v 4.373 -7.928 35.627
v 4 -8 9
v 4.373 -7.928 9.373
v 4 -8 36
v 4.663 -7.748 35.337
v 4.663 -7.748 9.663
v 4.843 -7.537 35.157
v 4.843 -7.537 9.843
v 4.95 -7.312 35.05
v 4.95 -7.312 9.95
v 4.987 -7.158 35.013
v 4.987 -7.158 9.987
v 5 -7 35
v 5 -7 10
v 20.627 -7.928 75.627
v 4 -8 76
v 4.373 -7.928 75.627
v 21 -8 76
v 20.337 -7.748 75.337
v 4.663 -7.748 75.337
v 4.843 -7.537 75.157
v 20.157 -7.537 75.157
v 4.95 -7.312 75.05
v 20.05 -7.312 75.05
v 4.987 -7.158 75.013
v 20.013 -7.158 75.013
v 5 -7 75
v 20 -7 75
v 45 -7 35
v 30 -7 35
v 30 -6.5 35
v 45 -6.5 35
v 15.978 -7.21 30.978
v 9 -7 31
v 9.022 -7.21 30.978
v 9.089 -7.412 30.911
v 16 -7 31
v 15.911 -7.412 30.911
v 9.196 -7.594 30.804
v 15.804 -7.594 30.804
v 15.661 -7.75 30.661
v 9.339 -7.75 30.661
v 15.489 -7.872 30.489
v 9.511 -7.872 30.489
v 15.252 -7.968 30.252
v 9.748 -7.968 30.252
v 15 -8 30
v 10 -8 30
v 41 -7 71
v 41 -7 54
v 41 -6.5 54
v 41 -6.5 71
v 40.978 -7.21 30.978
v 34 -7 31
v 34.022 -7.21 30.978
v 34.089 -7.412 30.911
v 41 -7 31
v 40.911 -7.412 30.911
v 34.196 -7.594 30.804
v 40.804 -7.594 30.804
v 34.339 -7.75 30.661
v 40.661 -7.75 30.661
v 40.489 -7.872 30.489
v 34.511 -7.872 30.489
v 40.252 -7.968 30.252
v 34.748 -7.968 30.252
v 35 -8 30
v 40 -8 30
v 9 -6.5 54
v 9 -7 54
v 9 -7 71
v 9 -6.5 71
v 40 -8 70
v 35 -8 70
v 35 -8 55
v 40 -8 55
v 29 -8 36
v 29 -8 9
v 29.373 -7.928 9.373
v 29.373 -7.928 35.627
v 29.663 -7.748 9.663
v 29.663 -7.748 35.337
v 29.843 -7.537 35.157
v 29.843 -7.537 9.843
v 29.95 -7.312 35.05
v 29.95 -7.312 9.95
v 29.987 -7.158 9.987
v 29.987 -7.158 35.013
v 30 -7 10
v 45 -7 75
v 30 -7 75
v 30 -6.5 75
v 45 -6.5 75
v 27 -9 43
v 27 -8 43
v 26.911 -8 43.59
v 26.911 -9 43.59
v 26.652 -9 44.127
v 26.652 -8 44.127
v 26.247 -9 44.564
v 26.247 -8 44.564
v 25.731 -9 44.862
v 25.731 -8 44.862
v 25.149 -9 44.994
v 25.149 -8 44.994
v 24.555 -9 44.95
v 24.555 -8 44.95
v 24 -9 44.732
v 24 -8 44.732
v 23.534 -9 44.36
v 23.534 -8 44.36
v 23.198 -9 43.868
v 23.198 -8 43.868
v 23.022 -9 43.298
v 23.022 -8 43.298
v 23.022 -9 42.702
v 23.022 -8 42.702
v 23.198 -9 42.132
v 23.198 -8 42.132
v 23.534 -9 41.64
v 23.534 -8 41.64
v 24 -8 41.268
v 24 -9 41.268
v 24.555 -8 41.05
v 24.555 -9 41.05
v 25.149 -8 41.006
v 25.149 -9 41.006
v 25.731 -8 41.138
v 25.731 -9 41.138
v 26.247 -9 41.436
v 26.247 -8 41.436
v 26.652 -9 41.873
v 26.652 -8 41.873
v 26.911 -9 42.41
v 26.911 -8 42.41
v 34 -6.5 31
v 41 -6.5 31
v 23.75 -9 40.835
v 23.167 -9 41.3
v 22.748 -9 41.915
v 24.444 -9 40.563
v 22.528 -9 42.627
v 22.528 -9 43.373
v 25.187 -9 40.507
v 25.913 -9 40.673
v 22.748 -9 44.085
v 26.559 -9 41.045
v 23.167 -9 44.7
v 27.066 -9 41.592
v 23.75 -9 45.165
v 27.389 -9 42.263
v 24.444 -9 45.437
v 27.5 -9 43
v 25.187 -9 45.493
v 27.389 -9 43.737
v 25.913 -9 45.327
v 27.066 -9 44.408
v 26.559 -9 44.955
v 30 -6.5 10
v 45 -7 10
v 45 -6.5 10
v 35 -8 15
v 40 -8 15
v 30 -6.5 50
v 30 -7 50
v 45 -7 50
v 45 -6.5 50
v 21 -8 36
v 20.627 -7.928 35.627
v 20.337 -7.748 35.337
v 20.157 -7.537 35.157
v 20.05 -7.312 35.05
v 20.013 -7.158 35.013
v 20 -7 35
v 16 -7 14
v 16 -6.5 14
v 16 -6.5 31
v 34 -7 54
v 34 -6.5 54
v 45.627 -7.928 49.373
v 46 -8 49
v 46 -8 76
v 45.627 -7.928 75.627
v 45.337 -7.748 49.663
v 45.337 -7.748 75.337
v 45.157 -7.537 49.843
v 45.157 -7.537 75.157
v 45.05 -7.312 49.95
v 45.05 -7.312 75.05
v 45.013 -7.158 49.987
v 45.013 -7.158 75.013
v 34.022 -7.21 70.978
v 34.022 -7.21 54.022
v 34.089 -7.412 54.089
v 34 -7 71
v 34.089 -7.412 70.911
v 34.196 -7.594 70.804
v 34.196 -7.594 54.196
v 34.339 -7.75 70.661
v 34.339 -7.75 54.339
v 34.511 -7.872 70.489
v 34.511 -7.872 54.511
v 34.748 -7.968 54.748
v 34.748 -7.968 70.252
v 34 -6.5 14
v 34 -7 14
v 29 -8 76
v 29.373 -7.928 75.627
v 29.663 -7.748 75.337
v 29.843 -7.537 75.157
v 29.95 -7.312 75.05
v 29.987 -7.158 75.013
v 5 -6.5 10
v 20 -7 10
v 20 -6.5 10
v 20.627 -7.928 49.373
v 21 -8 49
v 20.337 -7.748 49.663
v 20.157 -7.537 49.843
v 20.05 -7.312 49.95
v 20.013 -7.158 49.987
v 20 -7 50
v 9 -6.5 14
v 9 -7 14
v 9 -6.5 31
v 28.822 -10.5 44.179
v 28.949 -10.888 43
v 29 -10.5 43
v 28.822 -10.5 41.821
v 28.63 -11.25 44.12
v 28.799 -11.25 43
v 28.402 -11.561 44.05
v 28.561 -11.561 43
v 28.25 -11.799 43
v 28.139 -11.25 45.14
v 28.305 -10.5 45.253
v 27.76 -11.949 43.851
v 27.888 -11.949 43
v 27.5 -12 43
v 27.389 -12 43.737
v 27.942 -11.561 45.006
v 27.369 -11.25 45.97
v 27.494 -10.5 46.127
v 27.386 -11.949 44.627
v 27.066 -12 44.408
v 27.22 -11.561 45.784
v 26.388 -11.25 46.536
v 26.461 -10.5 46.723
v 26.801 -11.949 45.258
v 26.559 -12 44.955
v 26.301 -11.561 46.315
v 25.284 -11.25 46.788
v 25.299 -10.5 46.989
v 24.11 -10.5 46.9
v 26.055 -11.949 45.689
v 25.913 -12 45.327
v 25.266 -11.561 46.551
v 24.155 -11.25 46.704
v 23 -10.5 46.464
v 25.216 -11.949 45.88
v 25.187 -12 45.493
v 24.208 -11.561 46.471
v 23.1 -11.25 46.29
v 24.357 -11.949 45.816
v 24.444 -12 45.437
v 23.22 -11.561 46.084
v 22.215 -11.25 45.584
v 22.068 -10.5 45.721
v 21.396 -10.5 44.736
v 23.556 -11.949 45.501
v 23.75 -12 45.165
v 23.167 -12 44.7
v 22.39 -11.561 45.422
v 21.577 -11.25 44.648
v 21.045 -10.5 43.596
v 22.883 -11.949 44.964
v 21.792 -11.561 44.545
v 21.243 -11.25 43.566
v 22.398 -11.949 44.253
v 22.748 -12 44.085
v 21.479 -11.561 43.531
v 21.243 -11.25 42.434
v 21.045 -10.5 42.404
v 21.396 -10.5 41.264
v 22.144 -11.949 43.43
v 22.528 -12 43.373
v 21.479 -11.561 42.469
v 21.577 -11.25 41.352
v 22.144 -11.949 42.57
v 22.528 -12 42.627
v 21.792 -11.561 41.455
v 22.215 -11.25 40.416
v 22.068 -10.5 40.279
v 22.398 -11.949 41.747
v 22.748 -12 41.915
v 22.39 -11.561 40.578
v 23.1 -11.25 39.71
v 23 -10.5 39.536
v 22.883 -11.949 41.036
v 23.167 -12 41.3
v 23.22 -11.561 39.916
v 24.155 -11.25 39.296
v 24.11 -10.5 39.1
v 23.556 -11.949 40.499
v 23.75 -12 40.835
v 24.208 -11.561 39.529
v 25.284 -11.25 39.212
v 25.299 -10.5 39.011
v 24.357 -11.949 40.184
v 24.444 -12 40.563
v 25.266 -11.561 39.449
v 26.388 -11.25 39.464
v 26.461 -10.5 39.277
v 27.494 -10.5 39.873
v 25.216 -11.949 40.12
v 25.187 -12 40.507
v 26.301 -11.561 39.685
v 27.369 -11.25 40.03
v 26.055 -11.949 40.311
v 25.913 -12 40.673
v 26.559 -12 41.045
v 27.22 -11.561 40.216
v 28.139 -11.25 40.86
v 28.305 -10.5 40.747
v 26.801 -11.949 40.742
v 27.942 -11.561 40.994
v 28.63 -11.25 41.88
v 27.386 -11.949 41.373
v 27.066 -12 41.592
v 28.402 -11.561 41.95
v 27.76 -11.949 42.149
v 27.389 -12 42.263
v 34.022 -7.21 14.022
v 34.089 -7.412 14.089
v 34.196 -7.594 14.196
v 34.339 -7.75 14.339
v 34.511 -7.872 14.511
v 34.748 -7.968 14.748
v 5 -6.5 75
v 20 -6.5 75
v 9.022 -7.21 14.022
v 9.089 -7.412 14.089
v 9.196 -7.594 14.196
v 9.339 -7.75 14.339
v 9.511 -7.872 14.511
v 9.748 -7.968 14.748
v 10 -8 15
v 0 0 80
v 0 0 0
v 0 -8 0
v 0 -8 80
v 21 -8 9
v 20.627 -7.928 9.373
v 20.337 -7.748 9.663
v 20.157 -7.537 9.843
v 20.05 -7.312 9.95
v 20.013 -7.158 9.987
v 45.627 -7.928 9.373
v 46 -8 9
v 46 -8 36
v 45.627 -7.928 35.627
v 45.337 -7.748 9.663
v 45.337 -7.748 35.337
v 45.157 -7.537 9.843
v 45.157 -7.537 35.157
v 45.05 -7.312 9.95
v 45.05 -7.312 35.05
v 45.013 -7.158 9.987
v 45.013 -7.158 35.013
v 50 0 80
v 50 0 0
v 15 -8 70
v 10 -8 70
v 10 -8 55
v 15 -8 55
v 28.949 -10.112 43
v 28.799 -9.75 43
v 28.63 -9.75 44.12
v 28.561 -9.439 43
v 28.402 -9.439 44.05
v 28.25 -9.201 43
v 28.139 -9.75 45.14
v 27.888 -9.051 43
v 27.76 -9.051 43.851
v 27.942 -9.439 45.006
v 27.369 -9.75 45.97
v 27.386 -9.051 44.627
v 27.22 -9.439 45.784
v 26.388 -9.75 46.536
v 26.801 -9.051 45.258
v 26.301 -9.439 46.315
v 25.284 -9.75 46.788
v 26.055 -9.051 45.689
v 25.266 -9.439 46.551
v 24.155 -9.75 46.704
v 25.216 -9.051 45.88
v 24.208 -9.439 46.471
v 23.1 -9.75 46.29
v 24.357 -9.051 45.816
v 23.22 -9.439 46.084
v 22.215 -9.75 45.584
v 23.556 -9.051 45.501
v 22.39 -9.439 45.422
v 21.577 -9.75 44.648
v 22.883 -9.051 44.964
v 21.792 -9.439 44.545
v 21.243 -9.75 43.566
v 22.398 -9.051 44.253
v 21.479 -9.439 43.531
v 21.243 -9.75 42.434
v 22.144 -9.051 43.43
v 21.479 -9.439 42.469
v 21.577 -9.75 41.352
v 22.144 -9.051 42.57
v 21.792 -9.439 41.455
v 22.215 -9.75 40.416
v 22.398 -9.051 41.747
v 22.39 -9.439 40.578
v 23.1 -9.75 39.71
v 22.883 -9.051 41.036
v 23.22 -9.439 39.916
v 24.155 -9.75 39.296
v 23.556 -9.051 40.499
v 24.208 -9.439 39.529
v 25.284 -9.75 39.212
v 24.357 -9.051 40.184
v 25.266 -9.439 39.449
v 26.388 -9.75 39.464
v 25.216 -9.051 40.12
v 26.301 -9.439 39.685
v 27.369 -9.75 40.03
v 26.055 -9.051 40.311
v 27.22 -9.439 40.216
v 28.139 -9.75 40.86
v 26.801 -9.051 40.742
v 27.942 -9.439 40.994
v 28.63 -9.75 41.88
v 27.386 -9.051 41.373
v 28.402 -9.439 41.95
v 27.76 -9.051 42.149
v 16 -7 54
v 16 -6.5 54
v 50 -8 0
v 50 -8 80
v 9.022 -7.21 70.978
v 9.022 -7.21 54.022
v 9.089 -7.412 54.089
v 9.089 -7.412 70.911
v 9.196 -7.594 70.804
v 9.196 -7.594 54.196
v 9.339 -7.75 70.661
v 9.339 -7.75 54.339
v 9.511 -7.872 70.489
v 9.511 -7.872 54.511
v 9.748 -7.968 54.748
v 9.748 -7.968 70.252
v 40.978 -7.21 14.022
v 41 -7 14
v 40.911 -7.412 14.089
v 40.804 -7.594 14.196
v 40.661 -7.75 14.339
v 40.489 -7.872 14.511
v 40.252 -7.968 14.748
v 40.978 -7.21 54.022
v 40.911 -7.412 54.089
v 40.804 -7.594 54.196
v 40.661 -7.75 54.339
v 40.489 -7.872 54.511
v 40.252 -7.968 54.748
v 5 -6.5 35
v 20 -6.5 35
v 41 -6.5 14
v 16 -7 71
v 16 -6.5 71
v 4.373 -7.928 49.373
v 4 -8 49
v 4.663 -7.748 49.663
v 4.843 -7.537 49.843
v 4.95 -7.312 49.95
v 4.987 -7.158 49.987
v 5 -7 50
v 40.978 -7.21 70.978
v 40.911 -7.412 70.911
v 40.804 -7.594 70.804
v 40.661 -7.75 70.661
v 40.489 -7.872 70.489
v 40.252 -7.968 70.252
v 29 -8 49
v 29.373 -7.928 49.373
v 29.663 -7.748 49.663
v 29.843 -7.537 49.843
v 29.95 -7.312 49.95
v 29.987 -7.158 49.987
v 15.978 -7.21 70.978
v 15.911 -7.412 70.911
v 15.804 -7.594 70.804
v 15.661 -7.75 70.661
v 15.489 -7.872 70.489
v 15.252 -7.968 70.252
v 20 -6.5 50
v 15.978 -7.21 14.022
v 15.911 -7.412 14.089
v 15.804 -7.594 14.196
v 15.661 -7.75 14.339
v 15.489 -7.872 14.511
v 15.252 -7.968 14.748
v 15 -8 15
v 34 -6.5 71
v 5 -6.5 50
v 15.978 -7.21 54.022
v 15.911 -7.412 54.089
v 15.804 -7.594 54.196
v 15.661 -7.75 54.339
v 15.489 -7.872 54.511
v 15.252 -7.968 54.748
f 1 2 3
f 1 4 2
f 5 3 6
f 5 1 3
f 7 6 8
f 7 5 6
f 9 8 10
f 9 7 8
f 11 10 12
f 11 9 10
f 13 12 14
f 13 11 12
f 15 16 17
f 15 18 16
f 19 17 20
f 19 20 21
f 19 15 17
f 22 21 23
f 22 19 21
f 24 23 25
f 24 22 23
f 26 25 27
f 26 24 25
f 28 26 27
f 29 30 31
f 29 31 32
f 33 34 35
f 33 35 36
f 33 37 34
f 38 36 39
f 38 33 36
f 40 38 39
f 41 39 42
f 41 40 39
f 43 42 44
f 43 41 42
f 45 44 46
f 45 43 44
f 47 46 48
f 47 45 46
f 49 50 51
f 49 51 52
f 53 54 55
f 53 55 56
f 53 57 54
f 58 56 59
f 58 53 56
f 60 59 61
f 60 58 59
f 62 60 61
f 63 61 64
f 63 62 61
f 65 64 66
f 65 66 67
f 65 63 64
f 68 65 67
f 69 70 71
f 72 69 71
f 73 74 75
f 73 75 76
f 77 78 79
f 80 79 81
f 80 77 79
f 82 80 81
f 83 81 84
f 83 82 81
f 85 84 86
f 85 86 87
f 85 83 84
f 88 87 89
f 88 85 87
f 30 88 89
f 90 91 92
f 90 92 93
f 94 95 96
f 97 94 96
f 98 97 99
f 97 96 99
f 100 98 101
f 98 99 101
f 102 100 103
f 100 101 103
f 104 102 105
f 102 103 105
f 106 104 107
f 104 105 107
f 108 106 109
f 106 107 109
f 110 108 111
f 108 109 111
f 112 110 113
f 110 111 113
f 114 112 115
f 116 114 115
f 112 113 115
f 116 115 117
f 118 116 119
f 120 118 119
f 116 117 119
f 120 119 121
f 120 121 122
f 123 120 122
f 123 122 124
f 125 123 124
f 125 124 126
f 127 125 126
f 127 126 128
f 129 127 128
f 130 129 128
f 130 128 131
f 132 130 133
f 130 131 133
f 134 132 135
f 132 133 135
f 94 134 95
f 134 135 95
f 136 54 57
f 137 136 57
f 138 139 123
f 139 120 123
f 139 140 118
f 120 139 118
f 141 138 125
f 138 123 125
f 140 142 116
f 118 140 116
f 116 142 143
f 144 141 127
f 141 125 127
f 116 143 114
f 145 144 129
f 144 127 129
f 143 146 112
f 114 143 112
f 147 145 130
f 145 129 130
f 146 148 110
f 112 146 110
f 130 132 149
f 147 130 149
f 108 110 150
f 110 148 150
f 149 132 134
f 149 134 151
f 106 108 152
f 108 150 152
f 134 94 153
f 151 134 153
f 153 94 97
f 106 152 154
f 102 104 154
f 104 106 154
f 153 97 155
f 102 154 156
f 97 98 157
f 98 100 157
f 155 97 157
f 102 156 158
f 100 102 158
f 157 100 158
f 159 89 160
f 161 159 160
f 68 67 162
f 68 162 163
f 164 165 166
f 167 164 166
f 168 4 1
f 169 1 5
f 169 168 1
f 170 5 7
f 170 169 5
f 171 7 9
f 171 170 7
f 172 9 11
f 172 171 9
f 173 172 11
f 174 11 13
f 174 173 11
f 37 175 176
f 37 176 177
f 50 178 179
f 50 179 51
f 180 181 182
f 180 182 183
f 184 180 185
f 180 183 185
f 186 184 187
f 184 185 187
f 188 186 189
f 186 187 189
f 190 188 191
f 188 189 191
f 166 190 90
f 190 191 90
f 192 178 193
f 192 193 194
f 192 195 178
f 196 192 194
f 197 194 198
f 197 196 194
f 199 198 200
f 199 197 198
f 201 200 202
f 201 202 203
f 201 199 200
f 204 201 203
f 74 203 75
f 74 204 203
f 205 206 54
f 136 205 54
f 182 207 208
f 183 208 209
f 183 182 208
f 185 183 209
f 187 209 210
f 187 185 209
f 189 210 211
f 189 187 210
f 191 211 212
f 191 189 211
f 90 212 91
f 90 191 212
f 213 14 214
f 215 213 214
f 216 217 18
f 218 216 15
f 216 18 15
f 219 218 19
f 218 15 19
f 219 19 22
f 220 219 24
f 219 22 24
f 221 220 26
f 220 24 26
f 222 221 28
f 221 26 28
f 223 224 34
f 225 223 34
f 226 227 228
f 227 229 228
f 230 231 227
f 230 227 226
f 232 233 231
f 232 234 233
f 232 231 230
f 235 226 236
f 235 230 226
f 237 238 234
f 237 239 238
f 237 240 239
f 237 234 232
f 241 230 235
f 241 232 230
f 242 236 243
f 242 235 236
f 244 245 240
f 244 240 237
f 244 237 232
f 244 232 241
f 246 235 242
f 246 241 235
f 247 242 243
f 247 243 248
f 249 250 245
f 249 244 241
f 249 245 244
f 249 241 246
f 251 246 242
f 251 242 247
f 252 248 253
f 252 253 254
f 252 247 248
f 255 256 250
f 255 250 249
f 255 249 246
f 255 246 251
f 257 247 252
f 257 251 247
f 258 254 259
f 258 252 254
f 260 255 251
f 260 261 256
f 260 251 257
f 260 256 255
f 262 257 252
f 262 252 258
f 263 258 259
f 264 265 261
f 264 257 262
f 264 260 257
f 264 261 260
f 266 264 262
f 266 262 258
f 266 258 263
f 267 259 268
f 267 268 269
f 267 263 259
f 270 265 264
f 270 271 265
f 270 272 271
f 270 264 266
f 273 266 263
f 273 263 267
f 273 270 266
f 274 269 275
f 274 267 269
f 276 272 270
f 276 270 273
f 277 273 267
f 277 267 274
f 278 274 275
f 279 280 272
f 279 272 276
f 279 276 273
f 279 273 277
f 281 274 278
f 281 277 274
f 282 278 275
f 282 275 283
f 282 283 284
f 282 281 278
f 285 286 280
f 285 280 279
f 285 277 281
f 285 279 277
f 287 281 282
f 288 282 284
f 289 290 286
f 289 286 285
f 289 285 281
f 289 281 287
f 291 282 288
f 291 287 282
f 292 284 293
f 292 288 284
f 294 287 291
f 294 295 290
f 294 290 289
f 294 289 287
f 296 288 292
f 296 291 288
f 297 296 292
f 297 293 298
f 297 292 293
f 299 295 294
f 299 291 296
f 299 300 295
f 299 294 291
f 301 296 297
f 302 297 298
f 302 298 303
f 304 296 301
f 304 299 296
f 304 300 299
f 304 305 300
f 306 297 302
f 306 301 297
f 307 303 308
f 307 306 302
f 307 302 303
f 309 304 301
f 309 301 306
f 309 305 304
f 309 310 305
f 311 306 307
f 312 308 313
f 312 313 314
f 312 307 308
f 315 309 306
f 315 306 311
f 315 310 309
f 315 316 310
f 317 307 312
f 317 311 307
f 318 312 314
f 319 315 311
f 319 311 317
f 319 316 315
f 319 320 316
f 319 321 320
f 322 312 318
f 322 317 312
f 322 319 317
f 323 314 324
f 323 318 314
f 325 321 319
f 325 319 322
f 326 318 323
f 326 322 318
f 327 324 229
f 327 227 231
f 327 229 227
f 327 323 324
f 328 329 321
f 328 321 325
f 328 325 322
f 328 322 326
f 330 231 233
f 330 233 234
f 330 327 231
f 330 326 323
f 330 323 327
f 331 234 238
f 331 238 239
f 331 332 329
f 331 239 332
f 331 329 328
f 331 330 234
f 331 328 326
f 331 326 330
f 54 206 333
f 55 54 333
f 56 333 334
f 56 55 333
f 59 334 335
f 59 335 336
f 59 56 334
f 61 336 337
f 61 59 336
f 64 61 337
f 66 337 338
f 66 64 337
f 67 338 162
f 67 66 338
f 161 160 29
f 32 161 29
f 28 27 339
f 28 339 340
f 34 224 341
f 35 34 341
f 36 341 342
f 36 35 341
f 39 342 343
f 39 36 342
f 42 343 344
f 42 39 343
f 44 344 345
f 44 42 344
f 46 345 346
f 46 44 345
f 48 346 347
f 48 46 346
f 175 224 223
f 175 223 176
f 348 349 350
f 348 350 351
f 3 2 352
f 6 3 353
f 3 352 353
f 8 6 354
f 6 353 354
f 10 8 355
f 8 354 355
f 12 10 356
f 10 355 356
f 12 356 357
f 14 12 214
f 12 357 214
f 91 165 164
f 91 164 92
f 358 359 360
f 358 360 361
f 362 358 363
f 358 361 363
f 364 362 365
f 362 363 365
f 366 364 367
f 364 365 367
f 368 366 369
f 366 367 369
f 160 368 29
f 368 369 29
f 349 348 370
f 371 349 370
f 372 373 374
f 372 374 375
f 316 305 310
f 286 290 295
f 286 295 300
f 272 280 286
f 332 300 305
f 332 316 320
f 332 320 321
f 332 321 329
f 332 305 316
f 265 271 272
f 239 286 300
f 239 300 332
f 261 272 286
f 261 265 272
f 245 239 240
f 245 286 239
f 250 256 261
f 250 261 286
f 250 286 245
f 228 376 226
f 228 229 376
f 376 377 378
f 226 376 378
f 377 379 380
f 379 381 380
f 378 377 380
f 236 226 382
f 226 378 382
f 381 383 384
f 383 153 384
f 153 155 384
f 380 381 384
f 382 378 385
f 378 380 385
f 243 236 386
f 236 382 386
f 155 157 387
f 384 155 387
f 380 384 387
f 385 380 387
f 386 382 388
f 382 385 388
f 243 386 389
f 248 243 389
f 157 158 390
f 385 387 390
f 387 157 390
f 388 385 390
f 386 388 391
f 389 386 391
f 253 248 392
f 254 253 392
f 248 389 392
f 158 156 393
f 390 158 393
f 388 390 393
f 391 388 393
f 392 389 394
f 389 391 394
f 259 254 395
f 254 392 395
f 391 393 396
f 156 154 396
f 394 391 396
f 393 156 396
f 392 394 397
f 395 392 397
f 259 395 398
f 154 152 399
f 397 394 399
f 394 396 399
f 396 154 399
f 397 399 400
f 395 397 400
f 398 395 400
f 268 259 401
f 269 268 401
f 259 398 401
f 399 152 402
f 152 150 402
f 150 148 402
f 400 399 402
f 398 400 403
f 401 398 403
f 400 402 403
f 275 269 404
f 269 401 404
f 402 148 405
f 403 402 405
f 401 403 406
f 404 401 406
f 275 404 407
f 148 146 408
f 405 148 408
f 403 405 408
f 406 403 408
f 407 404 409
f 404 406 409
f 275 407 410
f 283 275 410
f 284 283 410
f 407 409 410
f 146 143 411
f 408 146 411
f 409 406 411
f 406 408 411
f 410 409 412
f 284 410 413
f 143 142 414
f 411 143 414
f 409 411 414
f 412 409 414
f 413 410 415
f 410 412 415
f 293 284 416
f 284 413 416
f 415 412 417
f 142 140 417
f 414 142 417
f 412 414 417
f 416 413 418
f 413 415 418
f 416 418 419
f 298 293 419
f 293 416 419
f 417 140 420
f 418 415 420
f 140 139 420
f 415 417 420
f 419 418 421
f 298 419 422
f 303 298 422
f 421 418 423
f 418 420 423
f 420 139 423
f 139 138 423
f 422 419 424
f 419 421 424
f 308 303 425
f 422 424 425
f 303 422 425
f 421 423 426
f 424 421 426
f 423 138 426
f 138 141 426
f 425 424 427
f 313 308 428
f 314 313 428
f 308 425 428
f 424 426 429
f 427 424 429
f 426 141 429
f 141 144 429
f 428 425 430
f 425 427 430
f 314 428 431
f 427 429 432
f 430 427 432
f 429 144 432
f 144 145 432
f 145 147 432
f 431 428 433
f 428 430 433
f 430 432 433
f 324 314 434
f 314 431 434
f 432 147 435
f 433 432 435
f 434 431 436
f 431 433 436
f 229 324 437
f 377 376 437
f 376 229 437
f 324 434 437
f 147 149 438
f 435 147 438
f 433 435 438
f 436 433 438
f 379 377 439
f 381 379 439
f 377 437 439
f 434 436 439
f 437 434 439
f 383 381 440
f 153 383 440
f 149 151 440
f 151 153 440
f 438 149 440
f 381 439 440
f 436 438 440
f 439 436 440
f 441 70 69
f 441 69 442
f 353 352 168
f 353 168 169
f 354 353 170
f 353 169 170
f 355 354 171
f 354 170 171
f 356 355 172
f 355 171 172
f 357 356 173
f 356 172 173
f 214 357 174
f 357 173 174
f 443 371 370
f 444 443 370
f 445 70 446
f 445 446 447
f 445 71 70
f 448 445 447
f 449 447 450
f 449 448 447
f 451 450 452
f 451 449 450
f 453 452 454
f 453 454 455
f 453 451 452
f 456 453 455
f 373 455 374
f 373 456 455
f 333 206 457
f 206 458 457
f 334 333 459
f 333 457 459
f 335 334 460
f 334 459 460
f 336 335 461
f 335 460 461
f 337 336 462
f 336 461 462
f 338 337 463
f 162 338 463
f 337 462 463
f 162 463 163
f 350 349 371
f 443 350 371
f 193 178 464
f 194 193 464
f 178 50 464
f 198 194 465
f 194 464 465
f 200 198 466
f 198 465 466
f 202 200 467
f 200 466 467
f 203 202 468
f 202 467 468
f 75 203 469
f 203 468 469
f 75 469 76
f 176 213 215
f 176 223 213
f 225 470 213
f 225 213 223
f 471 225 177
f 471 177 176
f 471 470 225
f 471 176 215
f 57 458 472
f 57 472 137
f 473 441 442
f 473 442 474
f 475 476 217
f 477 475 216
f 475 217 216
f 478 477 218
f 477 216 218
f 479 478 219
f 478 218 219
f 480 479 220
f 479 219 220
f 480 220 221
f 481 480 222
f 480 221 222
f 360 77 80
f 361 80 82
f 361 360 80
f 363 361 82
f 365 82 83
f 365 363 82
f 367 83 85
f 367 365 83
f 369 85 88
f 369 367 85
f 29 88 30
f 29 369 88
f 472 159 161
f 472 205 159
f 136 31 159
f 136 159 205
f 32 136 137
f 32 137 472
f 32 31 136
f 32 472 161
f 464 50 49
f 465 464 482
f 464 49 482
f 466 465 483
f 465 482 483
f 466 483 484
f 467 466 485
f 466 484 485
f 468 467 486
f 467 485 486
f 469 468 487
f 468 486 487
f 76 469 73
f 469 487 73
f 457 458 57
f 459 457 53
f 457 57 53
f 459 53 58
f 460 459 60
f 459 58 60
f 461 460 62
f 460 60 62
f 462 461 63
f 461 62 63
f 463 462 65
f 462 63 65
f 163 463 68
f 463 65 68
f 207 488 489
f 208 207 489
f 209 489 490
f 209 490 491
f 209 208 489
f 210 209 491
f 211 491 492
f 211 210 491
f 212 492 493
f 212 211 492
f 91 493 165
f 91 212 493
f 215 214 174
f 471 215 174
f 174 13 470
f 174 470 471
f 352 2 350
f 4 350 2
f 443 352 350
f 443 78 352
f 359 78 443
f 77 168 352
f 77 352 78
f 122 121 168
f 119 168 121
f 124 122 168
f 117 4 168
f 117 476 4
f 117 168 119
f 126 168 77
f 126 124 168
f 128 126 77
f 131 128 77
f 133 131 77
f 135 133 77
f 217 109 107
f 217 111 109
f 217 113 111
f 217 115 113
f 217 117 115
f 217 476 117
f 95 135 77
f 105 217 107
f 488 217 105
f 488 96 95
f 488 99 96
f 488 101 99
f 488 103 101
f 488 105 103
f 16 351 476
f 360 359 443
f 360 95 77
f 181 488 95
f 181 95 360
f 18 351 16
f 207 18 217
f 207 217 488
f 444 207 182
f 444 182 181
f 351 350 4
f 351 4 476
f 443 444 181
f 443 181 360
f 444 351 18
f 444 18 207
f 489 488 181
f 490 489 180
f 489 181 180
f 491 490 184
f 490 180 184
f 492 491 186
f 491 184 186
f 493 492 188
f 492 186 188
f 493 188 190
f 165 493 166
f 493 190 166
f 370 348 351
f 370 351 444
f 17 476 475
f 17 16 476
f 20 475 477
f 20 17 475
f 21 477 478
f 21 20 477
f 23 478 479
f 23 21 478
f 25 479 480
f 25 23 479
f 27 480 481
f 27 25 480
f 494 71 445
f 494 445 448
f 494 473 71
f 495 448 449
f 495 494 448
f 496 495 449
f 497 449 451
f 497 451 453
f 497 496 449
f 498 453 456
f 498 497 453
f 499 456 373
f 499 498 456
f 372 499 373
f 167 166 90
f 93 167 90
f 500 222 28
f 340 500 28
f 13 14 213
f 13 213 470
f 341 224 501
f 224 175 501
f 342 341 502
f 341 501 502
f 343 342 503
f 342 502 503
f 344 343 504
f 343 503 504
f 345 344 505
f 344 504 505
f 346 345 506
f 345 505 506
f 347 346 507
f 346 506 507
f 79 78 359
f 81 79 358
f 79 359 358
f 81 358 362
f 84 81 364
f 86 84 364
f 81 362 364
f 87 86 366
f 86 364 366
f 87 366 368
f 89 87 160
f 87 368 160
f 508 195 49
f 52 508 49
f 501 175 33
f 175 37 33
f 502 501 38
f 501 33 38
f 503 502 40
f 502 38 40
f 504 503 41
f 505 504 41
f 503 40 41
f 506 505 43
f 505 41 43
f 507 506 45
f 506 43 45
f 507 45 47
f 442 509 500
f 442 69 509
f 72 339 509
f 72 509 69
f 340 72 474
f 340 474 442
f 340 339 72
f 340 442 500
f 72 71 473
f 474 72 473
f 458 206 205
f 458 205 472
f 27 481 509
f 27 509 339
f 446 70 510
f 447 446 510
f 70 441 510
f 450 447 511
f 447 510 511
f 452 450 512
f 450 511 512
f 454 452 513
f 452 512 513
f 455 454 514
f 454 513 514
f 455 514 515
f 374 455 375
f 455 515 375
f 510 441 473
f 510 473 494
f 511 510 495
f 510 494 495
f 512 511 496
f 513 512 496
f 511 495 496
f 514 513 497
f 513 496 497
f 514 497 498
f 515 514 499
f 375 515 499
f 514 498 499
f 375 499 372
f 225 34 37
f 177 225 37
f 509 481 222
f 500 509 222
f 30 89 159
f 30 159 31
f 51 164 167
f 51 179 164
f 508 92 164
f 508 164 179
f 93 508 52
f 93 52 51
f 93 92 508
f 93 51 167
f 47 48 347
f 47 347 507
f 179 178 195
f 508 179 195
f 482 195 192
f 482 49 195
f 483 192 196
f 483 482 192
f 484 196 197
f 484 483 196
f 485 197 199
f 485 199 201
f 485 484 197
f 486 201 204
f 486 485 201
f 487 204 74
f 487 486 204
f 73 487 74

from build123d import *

# Parameters (mm, degrees)
F0_W     = 50
F0_H     = 80
F1_DEPTH = 8
F2_W     = 15
F2_H     = 25
F2_W_2   = 7
F2_H_2   = 17
F3_DEPTH = 1.5
F4_R     = 1
F5_R     = 2
F6_DEPTH = 1
F7_R     = 4
F7_R_2   = 2
F8_DEPTH = 3
F9_R     = 1.49999


# Not quite as in the source:
# - a fillet or chamfer is up to 0.001 mm smaller than in the source, because OpenCascade refuses the exact size


with BuildPart() as f1:
    # F0 (on Front) → F1 (new body)
    with BuildSketch(Plane.XZ):
        with Locations((25, 40)):
            Rectangle(F0_W, F0_H)
    extrude(amount=F1_DEPTH)

    # F2 (on face) → F3 (cut)
    with BuildSketch(Plane.XZ.offset(8)):
        with Locations((12.5, 62.5)):
            Rectangle(F2_W, F2_H)
        with Locations((12.5, 62.5)):
            Rectangle(F2_W_2, F2_H_2, mode=Mode.SUBTRACT)
        with Locations((37.5, 62.5)):
            Rectangle(F2_W, F2_H)
        with Locations((37.5, 62.5)):
            Rectangle(F2_W_2, F2_H_2, mode=Mode.SUBTRACT)
        with Locations((12.5, 22.5)):
            Rectangle(F2_W, F2_H)
        with Locations((12.5, 22.5)):
            Rectangle(F2_W_2, F2_H_2, mode=Mode.SUBTRACT)
        with Locations((37.5, 22.5)):
            Rectangle(F2_W, F2_H)
        with Locations((37.5, 22.5)):
            Rectangle(F2_W_2, F2_H_2, mode=Mode.SUBTRACT)
    extrude(amount=-F3_DEPTH, mode=Mode.SUBTRACT)

    # F4
    f4_edges = [f1.edges().sort_by_distance(p)[0] for p in [
        (16, -8, 62.5),
        (12.5, -8, 71),
        (9, -8, 62.5),
        (12.5, -8, 54),
        (5, -8, 62.5),
        (12.5, -8, 75),
        (20, -8, 62.5),
        (12.5, -8, 50),
        (37.5, -8, 75),
        (45, -8, 62.5),
        (37.5, -8, 71),
        (30, -8, 62.5),
        (34, -8, 62.5),
        (41, -8, 62.5),
        (37.5, -8, 54),
        (37.5, -8, 50),
        (37.5, -8, 35),
        (37.5, -8, 31),
        (34, -8, 22.5),
        (37.5, -8, 14),
        (41, -8, 22.5),
        (45, -8, 22.5),
        (37.5, -8, 10),
        (30, -8, 22.5),
        (20, -8, 22.5),
        (16, -8, 22.5),
        (9, -8, 22.5),
        (5, -8, 22.5),
        (12.5, -8, 35),
        (12.5, -8, 31),
        (12.5, -8, 14),
        (12.5, -8, 10),
    ]]
    fillet(f4_edges, radius=F4_R)

    # F5 (on face) → F6 (join)
    with BuildSketch(Plane.XZ.offset(8)):
        with Locations((25, 43)):
            Circle(F5_R)
    extrude(amount=F6_DEPTH)

    # F7 (on face) → F8 (join)
    with BuildSketch(Plane.XZ.offset(9)):
        with Locations((25, 43)):
            Circle(F7_R)
        with Locations((25, 43)):
            Circle(F7_R_2, mode=Mode.SUBTRACT)
        with Locations((25, 43)):
            Circle(F7_R_2)
    extrude(amount=F8_DEPTH)

    # F9 (radius 1.5 in the source; OpenCascade refuses exactly that, so slightly less here)
    f9_edges = [f1.edges().sort_by_distance(p)[0] for p in [
        (21, -12, 43),
        (21, -9, 43),
    ]]
    fillet(f9_edges, radius=F9_R)


solid = f1.part
